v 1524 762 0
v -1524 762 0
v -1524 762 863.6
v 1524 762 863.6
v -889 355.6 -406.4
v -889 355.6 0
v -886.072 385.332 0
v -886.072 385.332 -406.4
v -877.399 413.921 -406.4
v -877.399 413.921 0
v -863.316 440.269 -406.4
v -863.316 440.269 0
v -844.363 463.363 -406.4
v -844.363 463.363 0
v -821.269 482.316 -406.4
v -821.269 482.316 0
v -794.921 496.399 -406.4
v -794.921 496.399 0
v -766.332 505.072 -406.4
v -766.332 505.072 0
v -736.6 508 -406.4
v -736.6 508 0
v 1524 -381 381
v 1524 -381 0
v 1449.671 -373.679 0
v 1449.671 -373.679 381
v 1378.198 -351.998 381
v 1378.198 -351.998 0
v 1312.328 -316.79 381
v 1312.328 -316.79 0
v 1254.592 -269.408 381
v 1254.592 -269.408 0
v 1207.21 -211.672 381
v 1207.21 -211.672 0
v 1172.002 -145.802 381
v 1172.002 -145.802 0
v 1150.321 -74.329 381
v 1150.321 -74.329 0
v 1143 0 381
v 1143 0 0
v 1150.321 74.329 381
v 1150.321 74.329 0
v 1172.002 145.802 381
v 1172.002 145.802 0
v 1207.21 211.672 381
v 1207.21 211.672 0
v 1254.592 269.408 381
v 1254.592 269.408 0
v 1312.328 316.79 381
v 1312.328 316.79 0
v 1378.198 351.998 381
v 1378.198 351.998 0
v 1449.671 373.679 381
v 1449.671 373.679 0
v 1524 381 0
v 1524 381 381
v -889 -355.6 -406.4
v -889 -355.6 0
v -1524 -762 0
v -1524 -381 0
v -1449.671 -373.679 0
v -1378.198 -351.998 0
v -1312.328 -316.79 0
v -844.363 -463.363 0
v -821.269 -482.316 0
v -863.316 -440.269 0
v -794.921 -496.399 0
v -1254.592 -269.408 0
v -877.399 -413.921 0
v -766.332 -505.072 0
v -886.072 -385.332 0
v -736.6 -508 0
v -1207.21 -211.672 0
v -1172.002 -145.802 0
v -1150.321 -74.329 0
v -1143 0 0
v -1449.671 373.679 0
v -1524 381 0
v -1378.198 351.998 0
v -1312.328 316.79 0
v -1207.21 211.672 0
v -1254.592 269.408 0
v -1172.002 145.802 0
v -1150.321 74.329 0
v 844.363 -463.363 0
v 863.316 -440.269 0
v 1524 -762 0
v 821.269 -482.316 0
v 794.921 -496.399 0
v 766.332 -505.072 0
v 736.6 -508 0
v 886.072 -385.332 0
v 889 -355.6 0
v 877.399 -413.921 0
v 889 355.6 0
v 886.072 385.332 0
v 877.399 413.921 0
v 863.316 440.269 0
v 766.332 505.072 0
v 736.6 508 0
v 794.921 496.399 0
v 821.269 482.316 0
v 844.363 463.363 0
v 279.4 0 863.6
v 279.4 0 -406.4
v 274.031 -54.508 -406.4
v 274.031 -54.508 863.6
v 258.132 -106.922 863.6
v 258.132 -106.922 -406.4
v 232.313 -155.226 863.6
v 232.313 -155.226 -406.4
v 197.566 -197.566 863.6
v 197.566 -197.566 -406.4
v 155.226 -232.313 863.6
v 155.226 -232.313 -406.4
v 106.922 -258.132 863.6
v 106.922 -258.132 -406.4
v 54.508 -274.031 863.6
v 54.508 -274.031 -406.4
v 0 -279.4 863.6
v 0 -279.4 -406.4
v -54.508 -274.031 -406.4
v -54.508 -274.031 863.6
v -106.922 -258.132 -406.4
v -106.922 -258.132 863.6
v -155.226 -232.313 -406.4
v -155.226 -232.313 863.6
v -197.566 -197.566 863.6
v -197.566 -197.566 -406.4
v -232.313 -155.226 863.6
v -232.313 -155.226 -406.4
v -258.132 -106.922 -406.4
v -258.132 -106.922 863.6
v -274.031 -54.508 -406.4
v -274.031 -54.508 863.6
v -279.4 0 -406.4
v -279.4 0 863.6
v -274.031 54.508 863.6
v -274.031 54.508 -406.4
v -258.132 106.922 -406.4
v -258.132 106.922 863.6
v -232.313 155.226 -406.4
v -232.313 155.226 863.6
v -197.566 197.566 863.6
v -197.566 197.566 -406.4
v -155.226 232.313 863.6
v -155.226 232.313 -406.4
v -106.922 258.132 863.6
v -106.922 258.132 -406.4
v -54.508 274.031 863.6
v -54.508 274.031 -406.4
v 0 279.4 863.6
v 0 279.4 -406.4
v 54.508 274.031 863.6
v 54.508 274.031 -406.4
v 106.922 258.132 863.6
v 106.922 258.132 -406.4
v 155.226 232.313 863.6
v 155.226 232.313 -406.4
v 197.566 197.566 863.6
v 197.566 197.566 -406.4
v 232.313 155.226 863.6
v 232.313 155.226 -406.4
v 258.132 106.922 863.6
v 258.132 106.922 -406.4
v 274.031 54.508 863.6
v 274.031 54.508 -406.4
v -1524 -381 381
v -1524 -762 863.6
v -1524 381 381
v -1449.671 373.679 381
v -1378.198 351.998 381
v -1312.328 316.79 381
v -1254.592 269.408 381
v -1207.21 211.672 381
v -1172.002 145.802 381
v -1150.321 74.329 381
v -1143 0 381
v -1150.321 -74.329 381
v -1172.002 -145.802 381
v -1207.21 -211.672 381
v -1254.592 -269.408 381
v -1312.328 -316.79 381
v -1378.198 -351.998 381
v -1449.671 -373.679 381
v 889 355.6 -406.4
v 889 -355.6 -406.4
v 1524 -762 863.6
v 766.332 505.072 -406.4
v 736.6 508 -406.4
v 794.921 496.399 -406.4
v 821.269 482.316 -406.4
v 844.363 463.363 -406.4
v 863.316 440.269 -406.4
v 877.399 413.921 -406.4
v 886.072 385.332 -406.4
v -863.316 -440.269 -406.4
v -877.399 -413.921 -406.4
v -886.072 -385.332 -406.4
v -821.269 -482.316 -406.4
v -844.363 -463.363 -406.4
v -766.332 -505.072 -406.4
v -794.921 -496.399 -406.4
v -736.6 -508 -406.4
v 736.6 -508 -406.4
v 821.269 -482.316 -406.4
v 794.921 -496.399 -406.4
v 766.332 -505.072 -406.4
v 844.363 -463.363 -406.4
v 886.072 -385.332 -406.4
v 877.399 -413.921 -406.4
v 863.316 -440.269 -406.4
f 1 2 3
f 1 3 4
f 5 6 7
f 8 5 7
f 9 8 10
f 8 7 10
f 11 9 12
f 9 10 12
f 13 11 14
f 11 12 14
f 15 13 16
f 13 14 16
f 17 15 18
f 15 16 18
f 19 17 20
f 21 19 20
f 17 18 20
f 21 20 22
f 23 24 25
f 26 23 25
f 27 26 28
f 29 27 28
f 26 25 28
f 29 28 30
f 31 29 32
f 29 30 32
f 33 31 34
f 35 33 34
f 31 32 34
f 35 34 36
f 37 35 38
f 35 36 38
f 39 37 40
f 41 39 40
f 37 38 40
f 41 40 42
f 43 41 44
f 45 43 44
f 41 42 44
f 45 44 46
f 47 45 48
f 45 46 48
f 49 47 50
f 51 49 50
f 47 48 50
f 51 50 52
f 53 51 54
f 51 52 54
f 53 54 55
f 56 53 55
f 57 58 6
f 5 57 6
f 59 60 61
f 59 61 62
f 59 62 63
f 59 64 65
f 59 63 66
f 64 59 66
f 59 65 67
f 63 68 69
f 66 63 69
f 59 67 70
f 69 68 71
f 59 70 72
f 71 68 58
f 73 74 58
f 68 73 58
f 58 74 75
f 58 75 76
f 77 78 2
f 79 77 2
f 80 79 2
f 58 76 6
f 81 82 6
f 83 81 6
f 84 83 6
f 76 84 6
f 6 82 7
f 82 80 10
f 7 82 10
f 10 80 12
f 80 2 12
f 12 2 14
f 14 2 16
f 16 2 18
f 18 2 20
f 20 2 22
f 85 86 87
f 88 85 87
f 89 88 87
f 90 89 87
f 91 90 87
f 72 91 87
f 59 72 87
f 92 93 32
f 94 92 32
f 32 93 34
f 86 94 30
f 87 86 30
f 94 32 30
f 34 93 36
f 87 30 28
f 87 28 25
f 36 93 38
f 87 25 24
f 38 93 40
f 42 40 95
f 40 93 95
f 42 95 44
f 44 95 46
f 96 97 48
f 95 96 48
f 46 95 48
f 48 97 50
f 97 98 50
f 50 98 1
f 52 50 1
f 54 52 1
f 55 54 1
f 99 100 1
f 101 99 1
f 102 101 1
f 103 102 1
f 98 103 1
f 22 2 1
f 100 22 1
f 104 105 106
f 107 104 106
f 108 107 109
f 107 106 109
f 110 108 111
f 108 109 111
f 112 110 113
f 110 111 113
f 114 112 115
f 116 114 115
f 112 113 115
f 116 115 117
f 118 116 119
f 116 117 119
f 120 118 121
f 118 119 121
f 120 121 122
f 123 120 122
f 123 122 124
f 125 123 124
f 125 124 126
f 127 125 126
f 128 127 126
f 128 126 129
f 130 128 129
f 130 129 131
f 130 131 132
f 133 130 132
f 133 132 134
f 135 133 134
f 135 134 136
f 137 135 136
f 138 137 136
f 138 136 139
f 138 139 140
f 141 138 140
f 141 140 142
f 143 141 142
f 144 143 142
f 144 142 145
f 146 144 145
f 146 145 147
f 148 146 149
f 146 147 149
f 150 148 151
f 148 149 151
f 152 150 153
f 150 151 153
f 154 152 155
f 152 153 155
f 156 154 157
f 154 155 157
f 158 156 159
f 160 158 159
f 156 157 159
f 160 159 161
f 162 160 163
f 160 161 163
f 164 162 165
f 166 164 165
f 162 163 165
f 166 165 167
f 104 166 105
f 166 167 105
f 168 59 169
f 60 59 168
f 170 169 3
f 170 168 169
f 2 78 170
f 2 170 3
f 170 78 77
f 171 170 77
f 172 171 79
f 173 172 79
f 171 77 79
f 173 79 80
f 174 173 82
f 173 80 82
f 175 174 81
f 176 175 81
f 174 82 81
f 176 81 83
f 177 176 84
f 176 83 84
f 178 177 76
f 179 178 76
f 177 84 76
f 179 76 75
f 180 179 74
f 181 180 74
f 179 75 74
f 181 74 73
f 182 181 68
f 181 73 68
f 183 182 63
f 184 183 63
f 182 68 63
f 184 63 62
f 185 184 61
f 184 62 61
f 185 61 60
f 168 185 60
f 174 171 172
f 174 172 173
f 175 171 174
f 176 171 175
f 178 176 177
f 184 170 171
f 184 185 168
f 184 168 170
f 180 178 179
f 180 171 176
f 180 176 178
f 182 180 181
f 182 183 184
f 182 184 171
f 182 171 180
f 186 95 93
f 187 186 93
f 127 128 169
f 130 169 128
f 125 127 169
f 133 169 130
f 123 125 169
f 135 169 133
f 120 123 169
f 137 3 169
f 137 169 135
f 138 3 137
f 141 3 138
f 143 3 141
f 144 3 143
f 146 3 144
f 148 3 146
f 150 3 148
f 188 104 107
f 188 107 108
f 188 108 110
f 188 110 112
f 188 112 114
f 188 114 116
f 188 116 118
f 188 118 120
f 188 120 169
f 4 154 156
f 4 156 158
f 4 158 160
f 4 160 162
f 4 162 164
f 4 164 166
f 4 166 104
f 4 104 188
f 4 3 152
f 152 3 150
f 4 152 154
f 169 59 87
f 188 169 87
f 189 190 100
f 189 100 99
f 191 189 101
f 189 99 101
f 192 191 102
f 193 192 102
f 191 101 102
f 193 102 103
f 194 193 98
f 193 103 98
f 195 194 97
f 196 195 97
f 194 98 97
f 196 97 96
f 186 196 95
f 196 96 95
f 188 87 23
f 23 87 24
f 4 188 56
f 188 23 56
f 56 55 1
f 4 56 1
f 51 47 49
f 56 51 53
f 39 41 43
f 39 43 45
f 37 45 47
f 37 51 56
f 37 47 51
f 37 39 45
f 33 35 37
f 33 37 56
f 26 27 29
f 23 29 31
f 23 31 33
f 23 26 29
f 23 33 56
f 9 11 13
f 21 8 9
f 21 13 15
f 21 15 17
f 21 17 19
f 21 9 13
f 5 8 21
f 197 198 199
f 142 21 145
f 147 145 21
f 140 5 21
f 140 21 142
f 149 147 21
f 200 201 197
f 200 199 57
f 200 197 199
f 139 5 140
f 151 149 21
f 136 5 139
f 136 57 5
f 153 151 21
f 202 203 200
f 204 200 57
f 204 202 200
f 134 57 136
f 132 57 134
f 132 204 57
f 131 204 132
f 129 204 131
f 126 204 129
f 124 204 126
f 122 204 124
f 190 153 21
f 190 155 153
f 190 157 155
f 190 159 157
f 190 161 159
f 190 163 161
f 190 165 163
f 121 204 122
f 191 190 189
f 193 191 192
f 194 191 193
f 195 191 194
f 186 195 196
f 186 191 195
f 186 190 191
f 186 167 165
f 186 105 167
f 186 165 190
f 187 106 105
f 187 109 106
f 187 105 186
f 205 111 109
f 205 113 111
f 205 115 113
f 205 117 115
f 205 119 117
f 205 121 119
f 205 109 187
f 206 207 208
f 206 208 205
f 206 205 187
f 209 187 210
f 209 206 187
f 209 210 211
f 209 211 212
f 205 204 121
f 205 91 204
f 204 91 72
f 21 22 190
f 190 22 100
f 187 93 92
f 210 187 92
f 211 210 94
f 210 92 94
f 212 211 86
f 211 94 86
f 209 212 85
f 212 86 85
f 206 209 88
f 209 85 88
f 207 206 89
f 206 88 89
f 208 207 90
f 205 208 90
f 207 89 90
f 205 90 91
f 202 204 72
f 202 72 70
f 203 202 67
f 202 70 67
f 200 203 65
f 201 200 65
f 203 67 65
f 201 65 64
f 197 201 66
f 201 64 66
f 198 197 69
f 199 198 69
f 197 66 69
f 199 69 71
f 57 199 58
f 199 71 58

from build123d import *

# Parameters (mm, degrees)
F0_W     = 3048
F0_H     = 1524
F1_DEPTH = 863.6
F3_DEPTH = 381
F5_DEPTH = 406.4
F6_R     = 279.4
F7_DEPTH = 1270.001


with BuildPart() as f1:
    # F0 (on Top) → F1 (new body)
    with BuildSketch(Plane.XY):
        Rectangle(F0_W, F0_H)
    extrude(amount=F1_DEPTH)

    # F2 (on face) → F3 (cut)
    with BuildSketch(Plane(origin=(0, 0, 0), x_dir=(1, 0, 0), z_dir=(0, 0, -1))):
        with BuildLine():
            ThreePointArc((-1524, -381), (-1143, 0), (-1524, 381))
            Line((-1524, 381), (-1524, -381))
        make_face()
        with BuildLine():
            Line((1524, -381), (1524, 381))
            ThreePointArc((1524, 381), (1143, 0), (1524, -381))
        make_face()
    extrude(amount=-F3_DEPTH, mode=Mode.SUBTRACT)

    # F4 (on face) → F5 (join)
    with BuildSketch(Plane(origin=(0, 0, 0), x_dir=(1, 0, 0), z_dir=(0, 0, -1))):
        with BuildLine():
            ThreePointArc((889, 355.6), (844.363073, 463.363073), (736.6, 508))
            Line((736.6, 508), (-736.6, 508))
            ThreePointArc((-736.6, 508), (-844.363073, 463.363073), (-889, 355.6))
            Line((-889, 355.6), (-889, -355.6))
            ThreePointArc((-889, -355.6), (-844.363073, -463.363073), (-736.6, -508))
            Line((-736.6, -508), (736.6, -508))
            ThreePointArc((736.6, -508), (844.363073, -463.363073), (889, -355.6))
            Line((889, -355.6), (889, 355.6))
        make_face()
    extrude(amount=F5_DEPTH)

    # F6 (on face) → F7 (cut, through all)
    with BuildSketch(Plane(origin=(0, 0, -406.4), x_dir=(1, 0, 0), z_dir=(0, 0, -1))):
        Circle(F6_R)
    extrude(amount=-F7_DEPTH, mode=Mode.SUBTRACT)


solid = f1.part
